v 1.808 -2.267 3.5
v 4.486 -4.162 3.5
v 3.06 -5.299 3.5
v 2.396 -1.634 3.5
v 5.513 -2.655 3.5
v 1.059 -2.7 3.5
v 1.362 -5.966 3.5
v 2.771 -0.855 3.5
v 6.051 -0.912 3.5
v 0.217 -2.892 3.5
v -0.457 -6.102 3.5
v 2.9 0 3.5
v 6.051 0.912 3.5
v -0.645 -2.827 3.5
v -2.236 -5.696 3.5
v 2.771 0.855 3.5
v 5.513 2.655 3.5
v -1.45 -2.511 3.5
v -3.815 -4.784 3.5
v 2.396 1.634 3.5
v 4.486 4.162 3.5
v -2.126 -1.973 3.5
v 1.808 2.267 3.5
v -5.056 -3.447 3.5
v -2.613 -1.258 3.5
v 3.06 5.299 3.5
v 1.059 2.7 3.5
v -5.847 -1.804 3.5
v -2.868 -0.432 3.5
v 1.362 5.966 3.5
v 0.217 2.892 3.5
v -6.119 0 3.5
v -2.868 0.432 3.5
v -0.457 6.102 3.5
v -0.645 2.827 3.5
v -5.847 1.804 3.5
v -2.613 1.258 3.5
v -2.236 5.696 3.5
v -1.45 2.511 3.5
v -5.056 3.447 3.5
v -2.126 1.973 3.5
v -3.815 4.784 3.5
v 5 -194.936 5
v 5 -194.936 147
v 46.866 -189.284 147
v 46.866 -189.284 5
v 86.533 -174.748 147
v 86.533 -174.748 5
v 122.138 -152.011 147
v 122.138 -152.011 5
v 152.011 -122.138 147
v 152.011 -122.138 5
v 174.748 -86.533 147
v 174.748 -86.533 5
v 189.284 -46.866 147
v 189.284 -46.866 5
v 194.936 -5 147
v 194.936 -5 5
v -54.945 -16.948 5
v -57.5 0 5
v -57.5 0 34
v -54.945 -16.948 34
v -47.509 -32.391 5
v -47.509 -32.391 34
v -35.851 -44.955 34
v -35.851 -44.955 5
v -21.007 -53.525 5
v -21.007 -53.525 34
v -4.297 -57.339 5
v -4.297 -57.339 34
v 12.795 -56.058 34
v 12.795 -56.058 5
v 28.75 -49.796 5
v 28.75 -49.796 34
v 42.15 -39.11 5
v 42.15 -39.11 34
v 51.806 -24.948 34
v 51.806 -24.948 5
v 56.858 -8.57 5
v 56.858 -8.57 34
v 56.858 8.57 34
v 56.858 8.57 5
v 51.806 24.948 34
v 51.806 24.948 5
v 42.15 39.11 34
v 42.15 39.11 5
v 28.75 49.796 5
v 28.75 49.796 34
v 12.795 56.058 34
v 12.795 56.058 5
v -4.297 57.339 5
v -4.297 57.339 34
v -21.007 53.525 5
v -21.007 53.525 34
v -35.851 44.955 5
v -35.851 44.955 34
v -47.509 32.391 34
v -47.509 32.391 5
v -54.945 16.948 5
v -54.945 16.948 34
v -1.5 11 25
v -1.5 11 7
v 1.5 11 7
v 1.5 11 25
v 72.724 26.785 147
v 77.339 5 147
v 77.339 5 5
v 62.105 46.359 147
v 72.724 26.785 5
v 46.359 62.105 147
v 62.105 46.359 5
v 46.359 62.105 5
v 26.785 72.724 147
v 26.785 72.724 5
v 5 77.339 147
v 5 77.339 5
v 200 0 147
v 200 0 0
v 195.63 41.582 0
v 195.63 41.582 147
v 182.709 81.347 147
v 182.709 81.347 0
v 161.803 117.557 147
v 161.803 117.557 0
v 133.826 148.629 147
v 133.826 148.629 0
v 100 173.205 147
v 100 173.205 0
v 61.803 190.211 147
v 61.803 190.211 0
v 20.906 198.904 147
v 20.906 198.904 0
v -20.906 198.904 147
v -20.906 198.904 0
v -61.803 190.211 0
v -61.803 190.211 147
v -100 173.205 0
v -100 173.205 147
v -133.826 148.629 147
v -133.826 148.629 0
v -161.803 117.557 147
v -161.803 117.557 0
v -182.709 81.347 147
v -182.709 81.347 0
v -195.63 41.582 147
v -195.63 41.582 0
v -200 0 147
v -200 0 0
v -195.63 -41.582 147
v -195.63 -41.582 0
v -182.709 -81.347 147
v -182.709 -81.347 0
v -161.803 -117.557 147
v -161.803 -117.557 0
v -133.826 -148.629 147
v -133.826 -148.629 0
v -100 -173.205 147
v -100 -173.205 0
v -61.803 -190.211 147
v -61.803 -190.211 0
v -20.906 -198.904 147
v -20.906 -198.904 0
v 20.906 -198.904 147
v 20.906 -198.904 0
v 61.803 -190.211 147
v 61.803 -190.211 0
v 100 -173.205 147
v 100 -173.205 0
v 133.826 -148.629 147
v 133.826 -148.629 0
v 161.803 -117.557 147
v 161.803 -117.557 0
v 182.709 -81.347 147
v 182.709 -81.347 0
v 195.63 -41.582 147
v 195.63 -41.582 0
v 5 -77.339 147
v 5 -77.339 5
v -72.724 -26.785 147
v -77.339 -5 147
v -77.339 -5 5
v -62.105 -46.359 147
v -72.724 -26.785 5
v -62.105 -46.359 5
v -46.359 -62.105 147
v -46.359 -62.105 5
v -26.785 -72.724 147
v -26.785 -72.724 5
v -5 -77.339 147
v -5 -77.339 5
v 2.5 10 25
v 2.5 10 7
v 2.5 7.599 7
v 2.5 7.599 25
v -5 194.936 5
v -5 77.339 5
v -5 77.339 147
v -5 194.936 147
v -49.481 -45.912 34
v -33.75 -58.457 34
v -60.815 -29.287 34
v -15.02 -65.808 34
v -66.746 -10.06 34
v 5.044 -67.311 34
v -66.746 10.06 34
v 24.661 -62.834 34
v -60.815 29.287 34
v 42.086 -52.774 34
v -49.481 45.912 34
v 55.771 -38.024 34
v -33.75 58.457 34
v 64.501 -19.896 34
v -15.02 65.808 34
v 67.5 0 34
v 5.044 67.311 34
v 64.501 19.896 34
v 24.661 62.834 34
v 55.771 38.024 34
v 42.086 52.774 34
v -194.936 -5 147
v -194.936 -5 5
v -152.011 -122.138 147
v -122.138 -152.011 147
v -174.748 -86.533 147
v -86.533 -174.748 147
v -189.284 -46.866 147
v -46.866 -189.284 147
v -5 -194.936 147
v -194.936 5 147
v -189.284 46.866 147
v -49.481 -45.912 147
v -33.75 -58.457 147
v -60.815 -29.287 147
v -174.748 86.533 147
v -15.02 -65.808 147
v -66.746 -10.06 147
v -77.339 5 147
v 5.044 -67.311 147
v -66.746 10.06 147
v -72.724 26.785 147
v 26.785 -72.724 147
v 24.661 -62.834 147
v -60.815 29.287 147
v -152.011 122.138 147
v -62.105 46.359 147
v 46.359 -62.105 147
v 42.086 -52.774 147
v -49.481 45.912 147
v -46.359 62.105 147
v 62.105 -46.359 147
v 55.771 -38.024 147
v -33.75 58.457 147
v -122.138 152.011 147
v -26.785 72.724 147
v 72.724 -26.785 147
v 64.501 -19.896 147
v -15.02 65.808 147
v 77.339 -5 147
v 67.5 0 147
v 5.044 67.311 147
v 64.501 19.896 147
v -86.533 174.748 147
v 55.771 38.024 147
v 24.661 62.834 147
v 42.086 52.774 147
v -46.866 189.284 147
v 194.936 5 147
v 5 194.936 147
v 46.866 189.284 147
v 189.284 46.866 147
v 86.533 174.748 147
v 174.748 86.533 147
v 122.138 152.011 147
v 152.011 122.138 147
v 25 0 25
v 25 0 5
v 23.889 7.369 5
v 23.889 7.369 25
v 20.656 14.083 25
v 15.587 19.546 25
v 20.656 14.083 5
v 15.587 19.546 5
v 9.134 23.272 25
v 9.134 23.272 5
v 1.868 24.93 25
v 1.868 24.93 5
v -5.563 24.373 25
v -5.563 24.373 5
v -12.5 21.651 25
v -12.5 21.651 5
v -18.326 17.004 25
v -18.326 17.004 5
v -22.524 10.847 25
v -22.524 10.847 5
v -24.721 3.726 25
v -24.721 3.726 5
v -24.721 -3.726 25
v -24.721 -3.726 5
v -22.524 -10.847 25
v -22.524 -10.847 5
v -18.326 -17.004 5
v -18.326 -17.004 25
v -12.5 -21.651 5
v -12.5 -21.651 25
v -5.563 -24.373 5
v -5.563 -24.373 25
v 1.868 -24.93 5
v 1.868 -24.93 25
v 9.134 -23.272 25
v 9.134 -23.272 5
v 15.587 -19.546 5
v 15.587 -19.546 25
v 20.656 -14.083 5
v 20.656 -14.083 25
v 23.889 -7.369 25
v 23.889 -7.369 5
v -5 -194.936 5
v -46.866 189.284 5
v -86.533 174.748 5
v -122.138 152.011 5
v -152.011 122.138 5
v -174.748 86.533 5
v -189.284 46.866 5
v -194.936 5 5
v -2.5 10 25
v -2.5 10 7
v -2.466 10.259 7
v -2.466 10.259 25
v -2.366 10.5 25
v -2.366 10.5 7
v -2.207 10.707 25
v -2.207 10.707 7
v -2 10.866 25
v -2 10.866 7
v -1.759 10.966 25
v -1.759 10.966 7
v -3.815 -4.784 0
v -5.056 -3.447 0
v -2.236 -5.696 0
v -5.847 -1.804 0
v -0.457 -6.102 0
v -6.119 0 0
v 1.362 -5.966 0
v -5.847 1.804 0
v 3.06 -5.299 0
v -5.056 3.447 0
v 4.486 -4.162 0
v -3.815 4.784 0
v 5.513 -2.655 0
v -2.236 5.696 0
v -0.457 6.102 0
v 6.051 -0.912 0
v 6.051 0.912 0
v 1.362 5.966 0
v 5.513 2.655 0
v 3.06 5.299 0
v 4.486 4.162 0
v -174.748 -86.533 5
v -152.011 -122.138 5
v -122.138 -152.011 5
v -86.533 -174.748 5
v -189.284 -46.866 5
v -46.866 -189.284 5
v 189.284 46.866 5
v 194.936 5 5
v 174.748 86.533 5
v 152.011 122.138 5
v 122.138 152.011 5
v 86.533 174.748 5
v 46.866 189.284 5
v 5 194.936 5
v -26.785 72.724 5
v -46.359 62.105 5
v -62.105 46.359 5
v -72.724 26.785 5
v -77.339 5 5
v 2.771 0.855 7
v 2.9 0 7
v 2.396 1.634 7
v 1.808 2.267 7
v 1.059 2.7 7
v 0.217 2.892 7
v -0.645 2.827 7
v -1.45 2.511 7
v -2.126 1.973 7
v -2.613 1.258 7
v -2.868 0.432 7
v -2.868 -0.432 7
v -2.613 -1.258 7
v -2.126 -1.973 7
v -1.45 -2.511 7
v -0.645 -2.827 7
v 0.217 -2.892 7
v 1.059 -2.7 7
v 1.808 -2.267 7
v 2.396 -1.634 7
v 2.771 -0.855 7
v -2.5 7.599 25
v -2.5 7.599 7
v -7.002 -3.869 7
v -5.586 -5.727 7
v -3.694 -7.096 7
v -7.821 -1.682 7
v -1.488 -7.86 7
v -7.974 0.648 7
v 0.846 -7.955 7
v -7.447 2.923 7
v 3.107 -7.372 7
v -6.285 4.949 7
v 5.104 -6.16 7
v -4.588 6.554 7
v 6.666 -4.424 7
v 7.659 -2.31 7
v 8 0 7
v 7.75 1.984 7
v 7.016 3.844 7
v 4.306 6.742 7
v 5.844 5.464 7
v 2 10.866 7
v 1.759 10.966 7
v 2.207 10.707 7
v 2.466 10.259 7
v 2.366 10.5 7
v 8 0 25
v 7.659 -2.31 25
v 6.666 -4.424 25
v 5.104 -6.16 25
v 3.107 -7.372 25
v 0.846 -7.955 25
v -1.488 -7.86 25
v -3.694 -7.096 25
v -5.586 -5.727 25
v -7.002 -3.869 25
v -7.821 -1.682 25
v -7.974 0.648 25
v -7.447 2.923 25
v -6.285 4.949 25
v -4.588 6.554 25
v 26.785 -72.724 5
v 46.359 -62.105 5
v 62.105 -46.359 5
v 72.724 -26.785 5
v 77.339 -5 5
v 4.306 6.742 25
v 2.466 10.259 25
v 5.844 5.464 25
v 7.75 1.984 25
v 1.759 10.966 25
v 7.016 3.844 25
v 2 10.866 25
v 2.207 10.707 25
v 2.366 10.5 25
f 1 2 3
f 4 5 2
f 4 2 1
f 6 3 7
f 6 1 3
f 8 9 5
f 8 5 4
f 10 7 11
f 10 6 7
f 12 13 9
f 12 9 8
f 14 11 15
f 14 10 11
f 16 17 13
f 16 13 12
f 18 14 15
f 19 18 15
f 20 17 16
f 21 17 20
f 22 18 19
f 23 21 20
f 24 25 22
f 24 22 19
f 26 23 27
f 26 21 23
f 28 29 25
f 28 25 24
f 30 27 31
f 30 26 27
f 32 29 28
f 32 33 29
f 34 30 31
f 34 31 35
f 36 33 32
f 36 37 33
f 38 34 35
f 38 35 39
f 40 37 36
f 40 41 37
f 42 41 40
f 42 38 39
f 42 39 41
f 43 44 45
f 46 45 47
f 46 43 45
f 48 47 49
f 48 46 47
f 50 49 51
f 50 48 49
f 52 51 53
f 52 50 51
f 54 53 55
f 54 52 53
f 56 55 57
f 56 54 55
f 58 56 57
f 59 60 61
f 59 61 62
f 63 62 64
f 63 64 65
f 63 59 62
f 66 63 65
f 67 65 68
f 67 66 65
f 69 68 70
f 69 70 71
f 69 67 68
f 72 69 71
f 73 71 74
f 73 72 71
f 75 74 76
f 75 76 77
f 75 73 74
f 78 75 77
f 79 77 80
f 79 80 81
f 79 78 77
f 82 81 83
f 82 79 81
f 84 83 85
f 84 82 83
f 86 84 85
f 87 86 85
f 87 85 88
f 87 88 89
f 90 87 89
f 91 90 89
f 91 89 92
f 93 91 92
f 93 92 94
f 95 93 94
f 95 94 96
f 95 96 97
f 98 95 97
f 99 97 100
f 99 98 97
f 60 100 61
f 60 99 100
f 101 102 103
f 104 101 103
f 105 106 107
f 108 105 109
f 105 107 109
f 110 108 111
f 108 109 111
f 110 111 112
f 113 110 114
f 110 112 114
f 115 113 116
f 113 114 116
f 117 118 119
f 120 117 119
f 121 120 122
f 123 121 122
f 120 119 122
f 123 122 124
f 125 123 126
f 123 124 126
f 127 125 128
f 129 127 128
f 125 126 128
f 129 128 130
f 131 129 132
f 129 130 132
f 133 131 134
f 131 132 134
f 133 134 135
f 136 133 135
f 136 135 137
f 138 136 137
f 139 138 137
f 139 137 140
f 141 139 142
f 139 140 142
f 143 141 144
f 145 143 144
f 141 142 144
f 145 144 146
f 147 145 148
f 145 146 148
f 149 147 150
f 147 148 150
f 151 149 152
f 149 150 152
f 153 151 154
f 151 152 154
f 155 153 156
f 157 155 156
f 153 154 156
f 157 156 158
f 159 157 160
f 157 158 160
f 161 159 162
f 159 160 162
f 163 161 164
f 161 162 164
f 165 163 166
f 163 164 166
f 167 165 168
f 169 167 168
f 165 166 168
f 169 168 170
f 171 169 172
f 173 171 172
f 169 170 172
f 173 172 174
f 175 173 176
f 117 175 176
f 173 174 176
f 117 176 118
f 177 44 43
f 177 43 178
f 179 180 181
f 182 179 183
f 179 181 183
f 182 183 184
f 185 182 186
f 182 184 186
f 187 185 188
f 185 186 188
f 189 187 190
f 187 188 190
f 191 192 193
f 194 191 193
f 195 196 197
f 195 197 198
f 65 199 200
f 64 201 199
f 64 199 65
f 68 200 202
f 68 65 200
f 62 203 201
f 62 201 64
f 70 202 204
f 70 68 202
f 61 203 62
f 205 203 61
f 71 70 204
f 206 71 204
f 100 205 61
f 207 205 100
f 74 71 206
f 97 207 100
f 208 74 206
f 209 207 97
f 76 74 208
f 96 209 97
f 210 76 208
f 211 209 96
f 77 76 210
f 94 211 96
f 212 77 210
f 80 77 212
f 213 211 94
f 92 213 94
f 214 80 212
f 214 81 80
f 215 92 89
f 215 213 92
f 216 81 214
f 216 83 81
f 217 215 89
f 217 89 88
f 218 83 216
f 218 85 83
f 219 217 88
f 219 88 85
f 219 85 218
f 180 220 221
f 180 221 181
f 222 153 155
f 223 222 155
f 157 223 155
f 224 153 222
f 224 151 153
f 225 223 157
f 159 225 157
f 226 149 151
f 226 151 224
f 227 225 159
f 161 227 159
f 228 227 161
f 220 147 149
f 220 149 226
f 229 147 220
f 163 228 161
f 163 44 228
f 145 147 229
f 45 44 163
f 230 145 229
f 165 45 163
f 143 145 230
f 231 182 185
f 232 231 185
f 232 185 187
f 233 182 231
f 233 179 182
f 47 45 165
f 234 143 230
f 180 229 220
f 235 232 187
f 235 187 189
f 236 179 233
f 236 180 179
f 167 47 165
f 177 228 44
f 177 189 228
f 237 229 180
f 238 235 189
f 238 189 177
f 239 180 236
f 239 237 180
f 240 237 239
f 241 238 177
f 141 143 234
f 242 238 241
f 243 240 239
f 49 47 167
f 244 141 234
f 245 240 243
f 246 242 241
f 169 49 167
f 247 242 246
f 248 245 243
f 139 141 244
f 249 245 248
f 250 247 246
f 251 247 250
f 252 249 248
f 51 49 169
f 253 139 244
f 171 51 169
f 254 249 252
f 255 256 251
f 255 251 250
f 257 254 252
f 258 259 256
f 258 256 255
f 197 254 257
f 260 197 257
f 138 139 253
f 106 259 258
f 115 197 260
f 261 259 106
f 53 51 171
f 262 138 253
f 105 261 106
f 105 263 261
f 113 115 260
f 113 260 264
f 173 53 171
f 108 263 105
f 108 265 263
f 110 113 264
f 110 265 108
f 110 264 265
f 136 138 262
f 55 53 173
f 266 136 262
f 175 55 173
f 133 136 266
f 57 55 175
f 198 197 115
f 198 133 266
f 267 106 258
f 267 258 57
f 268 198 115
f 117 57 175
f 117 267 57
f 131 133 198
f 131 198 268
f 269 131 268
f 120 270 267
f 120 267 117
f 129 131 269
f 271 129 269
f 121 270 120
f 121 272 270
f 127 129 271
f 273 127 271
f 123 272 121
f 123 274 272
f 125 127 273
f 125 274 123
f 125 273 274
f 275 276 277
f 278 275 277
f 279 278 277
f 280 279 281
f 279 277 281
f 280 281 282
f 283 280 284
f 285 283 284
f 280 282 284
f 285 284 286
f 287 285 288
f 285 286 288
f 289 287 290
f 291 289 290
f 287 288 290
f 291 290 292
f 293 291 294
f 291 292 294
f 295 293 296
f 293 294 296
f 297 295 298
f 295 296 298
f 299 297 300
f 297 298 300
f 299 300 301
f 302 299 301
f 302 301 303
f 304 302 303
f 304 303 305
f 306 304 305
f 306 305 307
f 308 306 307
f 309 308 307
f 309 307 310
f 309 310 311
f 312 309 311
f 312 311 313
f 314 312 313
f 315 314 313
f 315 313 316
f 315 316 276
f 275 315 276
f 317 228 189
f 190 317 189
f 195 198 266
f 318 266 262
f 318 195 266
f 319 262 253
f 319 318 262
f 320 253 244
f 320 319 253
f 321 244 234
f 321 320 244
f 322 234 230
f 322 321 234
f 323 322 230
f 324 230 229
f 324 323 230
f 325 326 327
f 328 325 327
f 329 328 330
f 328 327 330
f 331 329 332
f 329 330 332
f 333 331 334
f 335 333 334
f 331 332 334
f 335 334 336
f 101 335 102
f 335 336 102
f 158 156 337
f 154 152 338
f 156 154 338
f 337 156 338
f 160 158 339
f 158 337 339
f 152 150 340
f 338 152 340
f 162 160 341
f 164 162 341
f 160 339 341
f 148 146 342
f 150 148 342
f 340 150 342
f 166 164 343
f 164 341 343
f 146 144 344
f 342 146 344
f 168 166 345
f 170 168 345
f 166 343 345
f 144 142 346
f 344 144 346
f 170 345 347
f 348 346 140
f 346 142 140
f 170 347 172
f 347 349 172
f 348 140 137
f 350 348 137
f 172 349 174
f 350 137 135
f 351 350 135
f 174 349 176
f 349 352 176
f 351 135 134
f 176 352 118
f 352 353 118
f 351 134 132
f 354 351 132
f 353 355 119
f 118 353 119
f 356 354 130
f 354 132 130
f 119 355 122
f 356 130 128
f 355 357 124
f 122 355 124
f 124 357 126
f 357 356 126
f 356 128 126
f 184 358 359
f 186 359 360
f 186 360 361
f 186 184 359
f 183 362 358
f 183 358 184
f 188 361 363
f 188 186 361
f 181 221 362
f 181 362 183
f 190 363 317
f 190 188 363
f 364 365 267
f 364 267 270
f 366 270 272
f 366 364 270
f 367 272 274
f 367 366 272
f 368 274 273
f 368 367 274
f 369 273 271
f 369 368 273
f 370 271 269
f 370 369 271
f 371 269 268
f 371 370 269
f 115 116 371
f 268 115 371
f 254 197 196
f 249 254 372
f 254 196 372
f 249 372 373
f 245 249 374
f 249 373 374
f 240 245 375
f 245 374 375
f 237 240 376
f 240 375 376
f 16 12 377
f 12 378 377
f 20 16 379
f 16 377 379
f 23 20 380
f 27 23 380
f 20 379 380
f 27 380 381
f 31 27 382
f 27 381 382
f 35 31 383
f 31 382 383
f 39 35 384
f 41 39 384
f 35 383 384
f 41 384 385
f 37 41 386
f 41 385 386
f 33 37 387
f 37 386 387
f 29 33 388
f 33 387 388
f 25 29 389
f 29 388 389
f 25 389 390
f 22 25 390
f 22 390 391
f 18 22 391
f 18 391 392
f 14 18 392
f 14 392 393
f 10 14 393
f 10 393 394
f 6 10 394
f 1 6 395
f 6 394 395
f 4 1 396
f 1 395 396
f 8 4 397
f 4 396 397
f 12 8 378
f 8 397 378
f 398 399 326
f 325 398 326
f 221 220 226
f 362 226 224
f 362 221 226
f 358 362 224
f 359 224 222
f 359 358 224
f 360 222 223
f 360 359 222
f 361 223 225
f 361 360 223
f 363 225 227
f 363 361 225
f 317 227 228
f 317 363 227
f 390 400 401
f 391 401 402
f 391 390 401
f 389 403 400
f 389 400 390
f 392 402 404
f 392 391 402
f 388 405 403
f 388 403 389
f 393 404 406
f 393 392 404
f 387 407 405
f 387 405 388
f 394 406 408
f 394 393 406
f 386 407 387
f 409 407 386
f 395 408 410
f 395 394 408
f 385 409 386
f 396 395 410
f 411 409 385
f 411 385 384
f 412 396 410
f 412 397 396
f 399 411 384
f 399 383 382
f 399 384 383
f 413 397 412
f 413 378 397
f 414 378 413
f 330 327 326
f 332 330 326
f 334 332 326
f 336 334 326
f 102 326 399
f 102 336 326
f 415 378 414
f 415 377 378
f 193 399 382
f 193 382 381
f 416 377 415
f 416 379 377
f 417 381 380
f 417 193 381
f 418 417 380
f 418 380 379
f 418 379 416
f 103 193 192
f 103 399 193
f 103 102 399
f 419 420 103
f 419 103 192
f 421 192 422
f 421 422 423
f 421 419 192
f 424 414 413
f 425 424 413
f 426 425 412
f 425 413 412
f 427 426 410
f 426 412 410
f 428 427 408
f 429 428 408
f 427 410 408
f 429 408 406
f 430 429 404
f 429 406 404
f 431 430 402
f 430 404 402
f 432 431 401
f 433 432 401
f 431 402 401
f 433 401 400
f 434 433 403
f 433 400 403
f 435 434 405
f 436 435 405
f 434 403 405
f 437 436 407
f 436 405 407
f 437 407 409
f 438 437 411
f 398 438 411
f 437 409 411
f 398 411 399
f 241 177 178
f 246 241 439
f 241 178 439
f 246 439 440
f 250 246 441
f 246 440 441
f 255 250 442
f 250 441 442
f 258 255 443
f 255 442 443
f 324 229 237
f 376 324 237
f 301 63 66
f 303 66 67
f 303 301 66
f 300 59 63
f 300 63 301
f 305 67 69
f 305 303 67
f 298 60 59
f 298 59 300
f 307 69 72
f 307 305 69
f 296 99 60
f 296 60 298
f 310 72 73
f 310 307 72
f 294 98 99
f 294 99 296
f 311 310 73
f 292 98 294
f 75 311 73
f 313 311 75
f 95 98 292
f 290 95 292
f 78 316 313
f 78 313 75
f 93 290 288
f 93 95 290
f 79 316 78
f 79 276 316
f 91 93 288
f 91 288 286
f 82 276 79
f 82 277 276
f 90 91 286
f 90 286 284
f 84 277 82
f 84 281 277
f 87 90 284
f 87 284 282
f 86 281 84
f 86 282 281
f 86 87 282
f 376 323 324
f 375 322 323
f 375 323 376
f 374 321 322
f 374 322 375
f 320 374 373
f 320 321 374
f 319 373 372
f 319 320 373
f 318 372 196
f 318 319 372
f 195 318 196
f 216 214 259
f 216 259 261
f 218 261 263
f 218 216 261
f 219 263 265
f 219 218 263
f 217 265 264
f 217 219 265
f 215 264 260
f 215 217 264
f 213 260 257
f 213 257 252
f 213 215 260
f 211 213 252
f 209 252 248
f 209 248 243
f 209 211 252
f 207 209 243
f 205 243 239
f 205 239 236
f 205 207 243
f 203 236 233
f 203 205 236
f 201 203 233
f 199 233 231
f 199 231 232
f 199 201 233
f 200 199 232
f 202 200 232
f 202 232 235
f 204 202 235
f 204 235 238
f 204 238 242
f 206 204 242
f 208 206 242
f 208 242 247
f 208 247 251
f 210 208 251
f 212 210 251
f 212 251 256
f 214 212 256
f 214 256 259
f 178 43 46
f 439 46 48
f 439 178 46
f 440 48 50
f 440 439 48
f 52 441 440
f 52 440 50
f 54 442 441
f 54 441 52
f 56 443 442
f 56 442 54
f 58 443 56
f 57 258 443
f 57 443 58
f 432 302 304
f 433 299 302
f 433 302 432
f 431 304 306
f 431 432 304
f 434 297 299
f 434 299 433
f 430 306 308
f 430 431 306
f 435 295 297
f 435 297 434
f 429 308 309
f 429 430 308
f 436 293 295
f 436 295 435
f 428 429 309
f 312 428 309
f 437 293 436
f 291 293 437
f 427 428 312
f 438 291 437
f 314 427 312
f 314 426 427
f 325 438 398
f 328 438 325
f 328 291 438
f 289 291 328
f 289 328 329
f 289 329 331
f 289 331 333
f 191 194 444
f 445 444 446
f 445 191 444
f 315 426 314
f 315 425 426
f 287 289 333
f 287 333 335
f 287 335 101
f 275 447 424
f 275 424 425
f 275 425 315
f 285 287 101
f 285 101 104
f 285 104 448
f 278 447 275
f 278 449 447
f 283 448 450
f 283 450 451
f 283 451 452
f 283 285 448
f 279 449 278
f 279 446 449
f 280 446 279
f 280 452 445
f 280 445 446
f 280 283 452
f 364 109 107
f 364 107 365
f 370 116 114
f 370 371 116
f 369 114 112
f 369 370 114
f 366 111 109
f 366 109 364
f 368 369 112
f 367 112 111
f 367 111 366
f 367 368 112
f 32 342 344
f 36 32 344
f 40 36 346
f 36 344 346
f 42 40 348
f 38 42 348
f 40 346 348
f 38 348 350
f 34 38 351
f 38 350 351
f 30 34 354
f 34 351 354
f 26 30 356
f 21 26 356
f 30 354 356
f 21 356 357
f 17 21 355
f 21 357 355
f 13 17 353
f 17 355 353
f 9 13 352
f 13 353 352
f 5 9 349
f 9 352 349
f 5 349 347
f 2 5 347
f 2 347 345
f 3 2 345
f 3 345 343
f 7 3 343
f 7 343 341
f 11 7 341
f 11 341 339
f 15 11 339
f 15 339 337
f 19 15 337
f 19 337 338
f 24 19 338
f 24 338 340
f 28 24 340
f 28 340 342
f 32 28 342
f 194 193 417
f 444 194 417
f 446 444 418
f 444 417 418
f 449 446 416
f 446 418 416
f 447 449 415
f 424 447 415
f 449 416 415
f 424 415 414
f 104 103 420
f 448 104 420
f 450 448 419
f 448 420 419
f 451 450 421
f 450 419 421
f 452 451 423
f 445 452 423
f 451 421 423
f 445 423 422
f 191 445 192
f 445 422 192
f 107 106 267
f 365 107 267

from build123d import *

# Parameters (mm, degrees)
SKETCH1_R                               = 67.5
SKETCH1_R_2                             = 25
BOSS_EXTRUDE1_DEPTH                     = 5
SKETCH1_R_3                             = 195
SKETCH1_R_4                             = 77.5
BOSS_EXTRUDE1_2_DEPTH                   = 5
SKETCH1_4_R                             = 200
SKETCH1_4_R_2                           = 195
BOSS_EXTRUDE2_DEPTH                     = 147
SKETCH1_5_R                             = 77.5
SKETCH1_5_R_2                           = 67.5
BOSS_EXTRUDE3_DEPTH                     = 147
SKETCH1_6_R                             = 25
BOSS_EXTRUDE4_DEPTH                     = 25
BOSS_EXTRUDE5_DEPTH                     = 7
CBORE_FOR_M5_HEX_HEAD_BOLT1_D           = 5.8
CBORE_FOR_M5_HEX_HEAD_BOLT1_CBORE_D     = 12.238
CBORE_FOR_M5_HEX_HEAD_BOLT1_CBORE_DEPTH = 3.5
RIB1_REACH                              = 320.762
SKETCH4_WALLS_W                         = 10
SKETCH4_WALLS_H                         = 759.430387561
SKETCH4_WALLS_H_2                       = 759.674772851
SKETCH4_WALLS_W_2                       = 760.012833466
SKETCH4_WALLS_H_3                       = 10
SKETCH4_WALLS_W_3                       = 759.068922963
SKETCH5_R                               = 70
SKETCH5_R_2                             = 57.5
BOSS_EXTRUDE6_DEPTH                     = 29


with BuildPart() as part:
    # Sketch1 → Boss-Extrude1 (new body)
    with BuildSketch(Plane.XY):
        Circle(SKETCH1_R)
        Circle(SKETCH1_R_2, mode=Mode.SUBTRACT)
    extrude(amount=BOSS_EXTRUDE1_DEPTH)



with BuildPart() as body_2:
    # Sketch1 → Boss-Extrude1 2 (new body)
    with BuildSketch(Plane.XY):
        Circle(SKETCH1_R_3)
        Circle(SKETCH1_R_4, mode=Mode.SUBTRACT)
    extrude(amount=BOSS_EXTRUDE1_2_DEPTH)

    # Sketch1<4> → Boss-Extrude2 (add)
    with BuildSketch(Plane.XY):
        Circle(SKETCH1_4_R)
        Circle(SKETCH1_4_R_2, mode=Mode.SUBTRACT)
    extrude(amount=BOSS_EXTRUDE2_DEPTH)


with BuildPart() as part_1:
    add(part.part)

    add(body_2.part)  # Boss-Extrude3 merges body 2
    # Sketch1<5> → Boss-Extrude3 (add)
    with BuildSketch(Plane.XY):
        Circle(SKETCH1_5_R)
        Circle(SKETCH1_5_R_2, mode=Mode.SUBTRACT)
    extrude(amount=BOSS_EXTRUDE3_DEPTH)

    # Sketch1<6> → Boss-Extrude4 (add)
    with BuildSketch(Plane.XY):
        Circle(SKETCH1_6_R)
        with BuildLine():
            Line((-1.5, 11), (1.5, 11))
            ThreePointArc((1.5, 11), (2.207106781, 10.707106781), (2.5, 10))
            Line((2.5, 10), (2.5, 7.599342077))
            ThreePointArc((2.5, 7.599342077), (6.480740698, 4.69041576), (8, 0))
            ThreePointArc((8, 0), (-4.69041576, -6.480740698), (-2.5, 7.599342077))
            Line((-2.5, 7.599342077), (-2.5, 10))
            ThreePointArc((-2.5, 10), (-2.207106781, 10.707106781), (-1.5, 11))
        make_face(mode=Mode.SUBTRACT)
    extrude(amount=BOSS_EXTRUDE4_DEPTH)

    # Sketch1<7> → Boss-Extrude5 (add)
    with BuildSketch(Plane.XY):
        with BuildLine():
            ThreePointArc((2.5, 10), (2.207106781, 10.707106781), (1.5, 11))
            Line((1.5, 11), (-1.5, 11))
            ThreePointArc((-1.5, 11), (-2.207106781, 10.707106781), (-2.5, 10))
            Line((-2.5, 10), (-2.5, 7.599342077))
            ThreePointArc((-2.5, 7.599342077), (0, -8), (2.5, 7.599342077))
            Line((2.5, 7.599342077), (2.5, 10))
        make_face()
    extrude(amount=BOSS_EXTRUDE5_DEPTH)

    # CBORE for M5 Hex Head Bolt1 (through all)
    with Locations(Plane(origin=(0, 0, 0), x_dir=(-1, 0, 0), z_dir=(0, 0, -1))):
        with Locations((0, 0)):
            CounterBoreHole(CBORE_FOR_M5_HEX_HEAD_BOLT1_D / 2, CBORE_FOR_M5_HEX_HEAD_BOLT1_CBORE_D / 2, CBORE_FOR_M5_HEX_HEAD_BOLT1_CBORE_DEPTH)

    # Sketch4 walls → Rib1 (add, up to next)
    with BuildSketch(Plane.XY.offset(147), mode=Mode.PRIVATE) as rib1_sk1:
        with Locations((0, 137.453527328)):
            Rectangle(SKETCH4_WALLS_W, SKETCH4_WALLS_H)
    rib1_tool1 = extrude(rib1_sk1.sketch, amount=-RIB1_REACH, mode=Mode.PRIVATE) - part_1.part
    # Sketch4 walls → Rib1 (add, up to next)
    with BuildSketch(Plane.XY.offset(147), mode=Mode.PRIVATE) as rib1_sk2:
        with Locations((0, -137.575719973)):
            Rectangle(SKETCH4_WALLS_W, SKETCH4_WALLS_H_2)
    rib1_tool2 = extrude(rib1_sk2.sketch, amount=-RIB1_REACH, mode=Mode.PRIVATE) - part_1.part
    # Sketch4 walls → Rib1 (add, up to next)
    with BuildSketch(Plane.XY.offset(147), mode=Mode.PRIVATE) as rib1_sk3:
        with Locations((137.74475028, 0)):
            Rectangle(SKETCH4_WALLS_W_2, SKETCH4_WALLS_H_3)
    rib1_tool3 = extrude(rib1_sk3.sketch, amount=-RIB1_REACH, mode=Mode.PRIVATE) - part_1.part
    # Sketch4 walls → Rib1 (add, up to next)
    with BuildSketch(Plane.XY.offset(147), mode=Mode.PRIVATE) as rib1_sk4:
        with Locations((-137.272795029, 0)):
            Rectangle(SKETCH4_WALLS_W_3, SKETCH4_WALLS_H_3)
    rib1_tool4 = extrude(rib1_sk4.sketch, amount=-RIB1_REACH, mode=Mode.PRIVATE) - part_1.part
    add(rib1_tool1.solids().sort_by_distance((0, 137.453527328, 147))[0])
    add(rib1_tool2.solids().sort_by_distance((0, -137.575719973, 147))[0])
    add(rib1_tool3.solids().sort_by_distance((137.74475028, 0, 147))[0])
    add(rib1_tool4.solids().sort_by_distance((-137.272795028, 0, 147))[0])

    # Sketch5 → Boss-Extrude6 (add)
    with BuildSketch(Plane.XY.offset(5)):
        Circle(SKETCH5_R)
        Circle(SKETCH5_R_2, mode=Mode.SUBTRACT)
    extrude(amount=BOSS_EXTRUDE6_DEPTH)


solid = part_1.part
